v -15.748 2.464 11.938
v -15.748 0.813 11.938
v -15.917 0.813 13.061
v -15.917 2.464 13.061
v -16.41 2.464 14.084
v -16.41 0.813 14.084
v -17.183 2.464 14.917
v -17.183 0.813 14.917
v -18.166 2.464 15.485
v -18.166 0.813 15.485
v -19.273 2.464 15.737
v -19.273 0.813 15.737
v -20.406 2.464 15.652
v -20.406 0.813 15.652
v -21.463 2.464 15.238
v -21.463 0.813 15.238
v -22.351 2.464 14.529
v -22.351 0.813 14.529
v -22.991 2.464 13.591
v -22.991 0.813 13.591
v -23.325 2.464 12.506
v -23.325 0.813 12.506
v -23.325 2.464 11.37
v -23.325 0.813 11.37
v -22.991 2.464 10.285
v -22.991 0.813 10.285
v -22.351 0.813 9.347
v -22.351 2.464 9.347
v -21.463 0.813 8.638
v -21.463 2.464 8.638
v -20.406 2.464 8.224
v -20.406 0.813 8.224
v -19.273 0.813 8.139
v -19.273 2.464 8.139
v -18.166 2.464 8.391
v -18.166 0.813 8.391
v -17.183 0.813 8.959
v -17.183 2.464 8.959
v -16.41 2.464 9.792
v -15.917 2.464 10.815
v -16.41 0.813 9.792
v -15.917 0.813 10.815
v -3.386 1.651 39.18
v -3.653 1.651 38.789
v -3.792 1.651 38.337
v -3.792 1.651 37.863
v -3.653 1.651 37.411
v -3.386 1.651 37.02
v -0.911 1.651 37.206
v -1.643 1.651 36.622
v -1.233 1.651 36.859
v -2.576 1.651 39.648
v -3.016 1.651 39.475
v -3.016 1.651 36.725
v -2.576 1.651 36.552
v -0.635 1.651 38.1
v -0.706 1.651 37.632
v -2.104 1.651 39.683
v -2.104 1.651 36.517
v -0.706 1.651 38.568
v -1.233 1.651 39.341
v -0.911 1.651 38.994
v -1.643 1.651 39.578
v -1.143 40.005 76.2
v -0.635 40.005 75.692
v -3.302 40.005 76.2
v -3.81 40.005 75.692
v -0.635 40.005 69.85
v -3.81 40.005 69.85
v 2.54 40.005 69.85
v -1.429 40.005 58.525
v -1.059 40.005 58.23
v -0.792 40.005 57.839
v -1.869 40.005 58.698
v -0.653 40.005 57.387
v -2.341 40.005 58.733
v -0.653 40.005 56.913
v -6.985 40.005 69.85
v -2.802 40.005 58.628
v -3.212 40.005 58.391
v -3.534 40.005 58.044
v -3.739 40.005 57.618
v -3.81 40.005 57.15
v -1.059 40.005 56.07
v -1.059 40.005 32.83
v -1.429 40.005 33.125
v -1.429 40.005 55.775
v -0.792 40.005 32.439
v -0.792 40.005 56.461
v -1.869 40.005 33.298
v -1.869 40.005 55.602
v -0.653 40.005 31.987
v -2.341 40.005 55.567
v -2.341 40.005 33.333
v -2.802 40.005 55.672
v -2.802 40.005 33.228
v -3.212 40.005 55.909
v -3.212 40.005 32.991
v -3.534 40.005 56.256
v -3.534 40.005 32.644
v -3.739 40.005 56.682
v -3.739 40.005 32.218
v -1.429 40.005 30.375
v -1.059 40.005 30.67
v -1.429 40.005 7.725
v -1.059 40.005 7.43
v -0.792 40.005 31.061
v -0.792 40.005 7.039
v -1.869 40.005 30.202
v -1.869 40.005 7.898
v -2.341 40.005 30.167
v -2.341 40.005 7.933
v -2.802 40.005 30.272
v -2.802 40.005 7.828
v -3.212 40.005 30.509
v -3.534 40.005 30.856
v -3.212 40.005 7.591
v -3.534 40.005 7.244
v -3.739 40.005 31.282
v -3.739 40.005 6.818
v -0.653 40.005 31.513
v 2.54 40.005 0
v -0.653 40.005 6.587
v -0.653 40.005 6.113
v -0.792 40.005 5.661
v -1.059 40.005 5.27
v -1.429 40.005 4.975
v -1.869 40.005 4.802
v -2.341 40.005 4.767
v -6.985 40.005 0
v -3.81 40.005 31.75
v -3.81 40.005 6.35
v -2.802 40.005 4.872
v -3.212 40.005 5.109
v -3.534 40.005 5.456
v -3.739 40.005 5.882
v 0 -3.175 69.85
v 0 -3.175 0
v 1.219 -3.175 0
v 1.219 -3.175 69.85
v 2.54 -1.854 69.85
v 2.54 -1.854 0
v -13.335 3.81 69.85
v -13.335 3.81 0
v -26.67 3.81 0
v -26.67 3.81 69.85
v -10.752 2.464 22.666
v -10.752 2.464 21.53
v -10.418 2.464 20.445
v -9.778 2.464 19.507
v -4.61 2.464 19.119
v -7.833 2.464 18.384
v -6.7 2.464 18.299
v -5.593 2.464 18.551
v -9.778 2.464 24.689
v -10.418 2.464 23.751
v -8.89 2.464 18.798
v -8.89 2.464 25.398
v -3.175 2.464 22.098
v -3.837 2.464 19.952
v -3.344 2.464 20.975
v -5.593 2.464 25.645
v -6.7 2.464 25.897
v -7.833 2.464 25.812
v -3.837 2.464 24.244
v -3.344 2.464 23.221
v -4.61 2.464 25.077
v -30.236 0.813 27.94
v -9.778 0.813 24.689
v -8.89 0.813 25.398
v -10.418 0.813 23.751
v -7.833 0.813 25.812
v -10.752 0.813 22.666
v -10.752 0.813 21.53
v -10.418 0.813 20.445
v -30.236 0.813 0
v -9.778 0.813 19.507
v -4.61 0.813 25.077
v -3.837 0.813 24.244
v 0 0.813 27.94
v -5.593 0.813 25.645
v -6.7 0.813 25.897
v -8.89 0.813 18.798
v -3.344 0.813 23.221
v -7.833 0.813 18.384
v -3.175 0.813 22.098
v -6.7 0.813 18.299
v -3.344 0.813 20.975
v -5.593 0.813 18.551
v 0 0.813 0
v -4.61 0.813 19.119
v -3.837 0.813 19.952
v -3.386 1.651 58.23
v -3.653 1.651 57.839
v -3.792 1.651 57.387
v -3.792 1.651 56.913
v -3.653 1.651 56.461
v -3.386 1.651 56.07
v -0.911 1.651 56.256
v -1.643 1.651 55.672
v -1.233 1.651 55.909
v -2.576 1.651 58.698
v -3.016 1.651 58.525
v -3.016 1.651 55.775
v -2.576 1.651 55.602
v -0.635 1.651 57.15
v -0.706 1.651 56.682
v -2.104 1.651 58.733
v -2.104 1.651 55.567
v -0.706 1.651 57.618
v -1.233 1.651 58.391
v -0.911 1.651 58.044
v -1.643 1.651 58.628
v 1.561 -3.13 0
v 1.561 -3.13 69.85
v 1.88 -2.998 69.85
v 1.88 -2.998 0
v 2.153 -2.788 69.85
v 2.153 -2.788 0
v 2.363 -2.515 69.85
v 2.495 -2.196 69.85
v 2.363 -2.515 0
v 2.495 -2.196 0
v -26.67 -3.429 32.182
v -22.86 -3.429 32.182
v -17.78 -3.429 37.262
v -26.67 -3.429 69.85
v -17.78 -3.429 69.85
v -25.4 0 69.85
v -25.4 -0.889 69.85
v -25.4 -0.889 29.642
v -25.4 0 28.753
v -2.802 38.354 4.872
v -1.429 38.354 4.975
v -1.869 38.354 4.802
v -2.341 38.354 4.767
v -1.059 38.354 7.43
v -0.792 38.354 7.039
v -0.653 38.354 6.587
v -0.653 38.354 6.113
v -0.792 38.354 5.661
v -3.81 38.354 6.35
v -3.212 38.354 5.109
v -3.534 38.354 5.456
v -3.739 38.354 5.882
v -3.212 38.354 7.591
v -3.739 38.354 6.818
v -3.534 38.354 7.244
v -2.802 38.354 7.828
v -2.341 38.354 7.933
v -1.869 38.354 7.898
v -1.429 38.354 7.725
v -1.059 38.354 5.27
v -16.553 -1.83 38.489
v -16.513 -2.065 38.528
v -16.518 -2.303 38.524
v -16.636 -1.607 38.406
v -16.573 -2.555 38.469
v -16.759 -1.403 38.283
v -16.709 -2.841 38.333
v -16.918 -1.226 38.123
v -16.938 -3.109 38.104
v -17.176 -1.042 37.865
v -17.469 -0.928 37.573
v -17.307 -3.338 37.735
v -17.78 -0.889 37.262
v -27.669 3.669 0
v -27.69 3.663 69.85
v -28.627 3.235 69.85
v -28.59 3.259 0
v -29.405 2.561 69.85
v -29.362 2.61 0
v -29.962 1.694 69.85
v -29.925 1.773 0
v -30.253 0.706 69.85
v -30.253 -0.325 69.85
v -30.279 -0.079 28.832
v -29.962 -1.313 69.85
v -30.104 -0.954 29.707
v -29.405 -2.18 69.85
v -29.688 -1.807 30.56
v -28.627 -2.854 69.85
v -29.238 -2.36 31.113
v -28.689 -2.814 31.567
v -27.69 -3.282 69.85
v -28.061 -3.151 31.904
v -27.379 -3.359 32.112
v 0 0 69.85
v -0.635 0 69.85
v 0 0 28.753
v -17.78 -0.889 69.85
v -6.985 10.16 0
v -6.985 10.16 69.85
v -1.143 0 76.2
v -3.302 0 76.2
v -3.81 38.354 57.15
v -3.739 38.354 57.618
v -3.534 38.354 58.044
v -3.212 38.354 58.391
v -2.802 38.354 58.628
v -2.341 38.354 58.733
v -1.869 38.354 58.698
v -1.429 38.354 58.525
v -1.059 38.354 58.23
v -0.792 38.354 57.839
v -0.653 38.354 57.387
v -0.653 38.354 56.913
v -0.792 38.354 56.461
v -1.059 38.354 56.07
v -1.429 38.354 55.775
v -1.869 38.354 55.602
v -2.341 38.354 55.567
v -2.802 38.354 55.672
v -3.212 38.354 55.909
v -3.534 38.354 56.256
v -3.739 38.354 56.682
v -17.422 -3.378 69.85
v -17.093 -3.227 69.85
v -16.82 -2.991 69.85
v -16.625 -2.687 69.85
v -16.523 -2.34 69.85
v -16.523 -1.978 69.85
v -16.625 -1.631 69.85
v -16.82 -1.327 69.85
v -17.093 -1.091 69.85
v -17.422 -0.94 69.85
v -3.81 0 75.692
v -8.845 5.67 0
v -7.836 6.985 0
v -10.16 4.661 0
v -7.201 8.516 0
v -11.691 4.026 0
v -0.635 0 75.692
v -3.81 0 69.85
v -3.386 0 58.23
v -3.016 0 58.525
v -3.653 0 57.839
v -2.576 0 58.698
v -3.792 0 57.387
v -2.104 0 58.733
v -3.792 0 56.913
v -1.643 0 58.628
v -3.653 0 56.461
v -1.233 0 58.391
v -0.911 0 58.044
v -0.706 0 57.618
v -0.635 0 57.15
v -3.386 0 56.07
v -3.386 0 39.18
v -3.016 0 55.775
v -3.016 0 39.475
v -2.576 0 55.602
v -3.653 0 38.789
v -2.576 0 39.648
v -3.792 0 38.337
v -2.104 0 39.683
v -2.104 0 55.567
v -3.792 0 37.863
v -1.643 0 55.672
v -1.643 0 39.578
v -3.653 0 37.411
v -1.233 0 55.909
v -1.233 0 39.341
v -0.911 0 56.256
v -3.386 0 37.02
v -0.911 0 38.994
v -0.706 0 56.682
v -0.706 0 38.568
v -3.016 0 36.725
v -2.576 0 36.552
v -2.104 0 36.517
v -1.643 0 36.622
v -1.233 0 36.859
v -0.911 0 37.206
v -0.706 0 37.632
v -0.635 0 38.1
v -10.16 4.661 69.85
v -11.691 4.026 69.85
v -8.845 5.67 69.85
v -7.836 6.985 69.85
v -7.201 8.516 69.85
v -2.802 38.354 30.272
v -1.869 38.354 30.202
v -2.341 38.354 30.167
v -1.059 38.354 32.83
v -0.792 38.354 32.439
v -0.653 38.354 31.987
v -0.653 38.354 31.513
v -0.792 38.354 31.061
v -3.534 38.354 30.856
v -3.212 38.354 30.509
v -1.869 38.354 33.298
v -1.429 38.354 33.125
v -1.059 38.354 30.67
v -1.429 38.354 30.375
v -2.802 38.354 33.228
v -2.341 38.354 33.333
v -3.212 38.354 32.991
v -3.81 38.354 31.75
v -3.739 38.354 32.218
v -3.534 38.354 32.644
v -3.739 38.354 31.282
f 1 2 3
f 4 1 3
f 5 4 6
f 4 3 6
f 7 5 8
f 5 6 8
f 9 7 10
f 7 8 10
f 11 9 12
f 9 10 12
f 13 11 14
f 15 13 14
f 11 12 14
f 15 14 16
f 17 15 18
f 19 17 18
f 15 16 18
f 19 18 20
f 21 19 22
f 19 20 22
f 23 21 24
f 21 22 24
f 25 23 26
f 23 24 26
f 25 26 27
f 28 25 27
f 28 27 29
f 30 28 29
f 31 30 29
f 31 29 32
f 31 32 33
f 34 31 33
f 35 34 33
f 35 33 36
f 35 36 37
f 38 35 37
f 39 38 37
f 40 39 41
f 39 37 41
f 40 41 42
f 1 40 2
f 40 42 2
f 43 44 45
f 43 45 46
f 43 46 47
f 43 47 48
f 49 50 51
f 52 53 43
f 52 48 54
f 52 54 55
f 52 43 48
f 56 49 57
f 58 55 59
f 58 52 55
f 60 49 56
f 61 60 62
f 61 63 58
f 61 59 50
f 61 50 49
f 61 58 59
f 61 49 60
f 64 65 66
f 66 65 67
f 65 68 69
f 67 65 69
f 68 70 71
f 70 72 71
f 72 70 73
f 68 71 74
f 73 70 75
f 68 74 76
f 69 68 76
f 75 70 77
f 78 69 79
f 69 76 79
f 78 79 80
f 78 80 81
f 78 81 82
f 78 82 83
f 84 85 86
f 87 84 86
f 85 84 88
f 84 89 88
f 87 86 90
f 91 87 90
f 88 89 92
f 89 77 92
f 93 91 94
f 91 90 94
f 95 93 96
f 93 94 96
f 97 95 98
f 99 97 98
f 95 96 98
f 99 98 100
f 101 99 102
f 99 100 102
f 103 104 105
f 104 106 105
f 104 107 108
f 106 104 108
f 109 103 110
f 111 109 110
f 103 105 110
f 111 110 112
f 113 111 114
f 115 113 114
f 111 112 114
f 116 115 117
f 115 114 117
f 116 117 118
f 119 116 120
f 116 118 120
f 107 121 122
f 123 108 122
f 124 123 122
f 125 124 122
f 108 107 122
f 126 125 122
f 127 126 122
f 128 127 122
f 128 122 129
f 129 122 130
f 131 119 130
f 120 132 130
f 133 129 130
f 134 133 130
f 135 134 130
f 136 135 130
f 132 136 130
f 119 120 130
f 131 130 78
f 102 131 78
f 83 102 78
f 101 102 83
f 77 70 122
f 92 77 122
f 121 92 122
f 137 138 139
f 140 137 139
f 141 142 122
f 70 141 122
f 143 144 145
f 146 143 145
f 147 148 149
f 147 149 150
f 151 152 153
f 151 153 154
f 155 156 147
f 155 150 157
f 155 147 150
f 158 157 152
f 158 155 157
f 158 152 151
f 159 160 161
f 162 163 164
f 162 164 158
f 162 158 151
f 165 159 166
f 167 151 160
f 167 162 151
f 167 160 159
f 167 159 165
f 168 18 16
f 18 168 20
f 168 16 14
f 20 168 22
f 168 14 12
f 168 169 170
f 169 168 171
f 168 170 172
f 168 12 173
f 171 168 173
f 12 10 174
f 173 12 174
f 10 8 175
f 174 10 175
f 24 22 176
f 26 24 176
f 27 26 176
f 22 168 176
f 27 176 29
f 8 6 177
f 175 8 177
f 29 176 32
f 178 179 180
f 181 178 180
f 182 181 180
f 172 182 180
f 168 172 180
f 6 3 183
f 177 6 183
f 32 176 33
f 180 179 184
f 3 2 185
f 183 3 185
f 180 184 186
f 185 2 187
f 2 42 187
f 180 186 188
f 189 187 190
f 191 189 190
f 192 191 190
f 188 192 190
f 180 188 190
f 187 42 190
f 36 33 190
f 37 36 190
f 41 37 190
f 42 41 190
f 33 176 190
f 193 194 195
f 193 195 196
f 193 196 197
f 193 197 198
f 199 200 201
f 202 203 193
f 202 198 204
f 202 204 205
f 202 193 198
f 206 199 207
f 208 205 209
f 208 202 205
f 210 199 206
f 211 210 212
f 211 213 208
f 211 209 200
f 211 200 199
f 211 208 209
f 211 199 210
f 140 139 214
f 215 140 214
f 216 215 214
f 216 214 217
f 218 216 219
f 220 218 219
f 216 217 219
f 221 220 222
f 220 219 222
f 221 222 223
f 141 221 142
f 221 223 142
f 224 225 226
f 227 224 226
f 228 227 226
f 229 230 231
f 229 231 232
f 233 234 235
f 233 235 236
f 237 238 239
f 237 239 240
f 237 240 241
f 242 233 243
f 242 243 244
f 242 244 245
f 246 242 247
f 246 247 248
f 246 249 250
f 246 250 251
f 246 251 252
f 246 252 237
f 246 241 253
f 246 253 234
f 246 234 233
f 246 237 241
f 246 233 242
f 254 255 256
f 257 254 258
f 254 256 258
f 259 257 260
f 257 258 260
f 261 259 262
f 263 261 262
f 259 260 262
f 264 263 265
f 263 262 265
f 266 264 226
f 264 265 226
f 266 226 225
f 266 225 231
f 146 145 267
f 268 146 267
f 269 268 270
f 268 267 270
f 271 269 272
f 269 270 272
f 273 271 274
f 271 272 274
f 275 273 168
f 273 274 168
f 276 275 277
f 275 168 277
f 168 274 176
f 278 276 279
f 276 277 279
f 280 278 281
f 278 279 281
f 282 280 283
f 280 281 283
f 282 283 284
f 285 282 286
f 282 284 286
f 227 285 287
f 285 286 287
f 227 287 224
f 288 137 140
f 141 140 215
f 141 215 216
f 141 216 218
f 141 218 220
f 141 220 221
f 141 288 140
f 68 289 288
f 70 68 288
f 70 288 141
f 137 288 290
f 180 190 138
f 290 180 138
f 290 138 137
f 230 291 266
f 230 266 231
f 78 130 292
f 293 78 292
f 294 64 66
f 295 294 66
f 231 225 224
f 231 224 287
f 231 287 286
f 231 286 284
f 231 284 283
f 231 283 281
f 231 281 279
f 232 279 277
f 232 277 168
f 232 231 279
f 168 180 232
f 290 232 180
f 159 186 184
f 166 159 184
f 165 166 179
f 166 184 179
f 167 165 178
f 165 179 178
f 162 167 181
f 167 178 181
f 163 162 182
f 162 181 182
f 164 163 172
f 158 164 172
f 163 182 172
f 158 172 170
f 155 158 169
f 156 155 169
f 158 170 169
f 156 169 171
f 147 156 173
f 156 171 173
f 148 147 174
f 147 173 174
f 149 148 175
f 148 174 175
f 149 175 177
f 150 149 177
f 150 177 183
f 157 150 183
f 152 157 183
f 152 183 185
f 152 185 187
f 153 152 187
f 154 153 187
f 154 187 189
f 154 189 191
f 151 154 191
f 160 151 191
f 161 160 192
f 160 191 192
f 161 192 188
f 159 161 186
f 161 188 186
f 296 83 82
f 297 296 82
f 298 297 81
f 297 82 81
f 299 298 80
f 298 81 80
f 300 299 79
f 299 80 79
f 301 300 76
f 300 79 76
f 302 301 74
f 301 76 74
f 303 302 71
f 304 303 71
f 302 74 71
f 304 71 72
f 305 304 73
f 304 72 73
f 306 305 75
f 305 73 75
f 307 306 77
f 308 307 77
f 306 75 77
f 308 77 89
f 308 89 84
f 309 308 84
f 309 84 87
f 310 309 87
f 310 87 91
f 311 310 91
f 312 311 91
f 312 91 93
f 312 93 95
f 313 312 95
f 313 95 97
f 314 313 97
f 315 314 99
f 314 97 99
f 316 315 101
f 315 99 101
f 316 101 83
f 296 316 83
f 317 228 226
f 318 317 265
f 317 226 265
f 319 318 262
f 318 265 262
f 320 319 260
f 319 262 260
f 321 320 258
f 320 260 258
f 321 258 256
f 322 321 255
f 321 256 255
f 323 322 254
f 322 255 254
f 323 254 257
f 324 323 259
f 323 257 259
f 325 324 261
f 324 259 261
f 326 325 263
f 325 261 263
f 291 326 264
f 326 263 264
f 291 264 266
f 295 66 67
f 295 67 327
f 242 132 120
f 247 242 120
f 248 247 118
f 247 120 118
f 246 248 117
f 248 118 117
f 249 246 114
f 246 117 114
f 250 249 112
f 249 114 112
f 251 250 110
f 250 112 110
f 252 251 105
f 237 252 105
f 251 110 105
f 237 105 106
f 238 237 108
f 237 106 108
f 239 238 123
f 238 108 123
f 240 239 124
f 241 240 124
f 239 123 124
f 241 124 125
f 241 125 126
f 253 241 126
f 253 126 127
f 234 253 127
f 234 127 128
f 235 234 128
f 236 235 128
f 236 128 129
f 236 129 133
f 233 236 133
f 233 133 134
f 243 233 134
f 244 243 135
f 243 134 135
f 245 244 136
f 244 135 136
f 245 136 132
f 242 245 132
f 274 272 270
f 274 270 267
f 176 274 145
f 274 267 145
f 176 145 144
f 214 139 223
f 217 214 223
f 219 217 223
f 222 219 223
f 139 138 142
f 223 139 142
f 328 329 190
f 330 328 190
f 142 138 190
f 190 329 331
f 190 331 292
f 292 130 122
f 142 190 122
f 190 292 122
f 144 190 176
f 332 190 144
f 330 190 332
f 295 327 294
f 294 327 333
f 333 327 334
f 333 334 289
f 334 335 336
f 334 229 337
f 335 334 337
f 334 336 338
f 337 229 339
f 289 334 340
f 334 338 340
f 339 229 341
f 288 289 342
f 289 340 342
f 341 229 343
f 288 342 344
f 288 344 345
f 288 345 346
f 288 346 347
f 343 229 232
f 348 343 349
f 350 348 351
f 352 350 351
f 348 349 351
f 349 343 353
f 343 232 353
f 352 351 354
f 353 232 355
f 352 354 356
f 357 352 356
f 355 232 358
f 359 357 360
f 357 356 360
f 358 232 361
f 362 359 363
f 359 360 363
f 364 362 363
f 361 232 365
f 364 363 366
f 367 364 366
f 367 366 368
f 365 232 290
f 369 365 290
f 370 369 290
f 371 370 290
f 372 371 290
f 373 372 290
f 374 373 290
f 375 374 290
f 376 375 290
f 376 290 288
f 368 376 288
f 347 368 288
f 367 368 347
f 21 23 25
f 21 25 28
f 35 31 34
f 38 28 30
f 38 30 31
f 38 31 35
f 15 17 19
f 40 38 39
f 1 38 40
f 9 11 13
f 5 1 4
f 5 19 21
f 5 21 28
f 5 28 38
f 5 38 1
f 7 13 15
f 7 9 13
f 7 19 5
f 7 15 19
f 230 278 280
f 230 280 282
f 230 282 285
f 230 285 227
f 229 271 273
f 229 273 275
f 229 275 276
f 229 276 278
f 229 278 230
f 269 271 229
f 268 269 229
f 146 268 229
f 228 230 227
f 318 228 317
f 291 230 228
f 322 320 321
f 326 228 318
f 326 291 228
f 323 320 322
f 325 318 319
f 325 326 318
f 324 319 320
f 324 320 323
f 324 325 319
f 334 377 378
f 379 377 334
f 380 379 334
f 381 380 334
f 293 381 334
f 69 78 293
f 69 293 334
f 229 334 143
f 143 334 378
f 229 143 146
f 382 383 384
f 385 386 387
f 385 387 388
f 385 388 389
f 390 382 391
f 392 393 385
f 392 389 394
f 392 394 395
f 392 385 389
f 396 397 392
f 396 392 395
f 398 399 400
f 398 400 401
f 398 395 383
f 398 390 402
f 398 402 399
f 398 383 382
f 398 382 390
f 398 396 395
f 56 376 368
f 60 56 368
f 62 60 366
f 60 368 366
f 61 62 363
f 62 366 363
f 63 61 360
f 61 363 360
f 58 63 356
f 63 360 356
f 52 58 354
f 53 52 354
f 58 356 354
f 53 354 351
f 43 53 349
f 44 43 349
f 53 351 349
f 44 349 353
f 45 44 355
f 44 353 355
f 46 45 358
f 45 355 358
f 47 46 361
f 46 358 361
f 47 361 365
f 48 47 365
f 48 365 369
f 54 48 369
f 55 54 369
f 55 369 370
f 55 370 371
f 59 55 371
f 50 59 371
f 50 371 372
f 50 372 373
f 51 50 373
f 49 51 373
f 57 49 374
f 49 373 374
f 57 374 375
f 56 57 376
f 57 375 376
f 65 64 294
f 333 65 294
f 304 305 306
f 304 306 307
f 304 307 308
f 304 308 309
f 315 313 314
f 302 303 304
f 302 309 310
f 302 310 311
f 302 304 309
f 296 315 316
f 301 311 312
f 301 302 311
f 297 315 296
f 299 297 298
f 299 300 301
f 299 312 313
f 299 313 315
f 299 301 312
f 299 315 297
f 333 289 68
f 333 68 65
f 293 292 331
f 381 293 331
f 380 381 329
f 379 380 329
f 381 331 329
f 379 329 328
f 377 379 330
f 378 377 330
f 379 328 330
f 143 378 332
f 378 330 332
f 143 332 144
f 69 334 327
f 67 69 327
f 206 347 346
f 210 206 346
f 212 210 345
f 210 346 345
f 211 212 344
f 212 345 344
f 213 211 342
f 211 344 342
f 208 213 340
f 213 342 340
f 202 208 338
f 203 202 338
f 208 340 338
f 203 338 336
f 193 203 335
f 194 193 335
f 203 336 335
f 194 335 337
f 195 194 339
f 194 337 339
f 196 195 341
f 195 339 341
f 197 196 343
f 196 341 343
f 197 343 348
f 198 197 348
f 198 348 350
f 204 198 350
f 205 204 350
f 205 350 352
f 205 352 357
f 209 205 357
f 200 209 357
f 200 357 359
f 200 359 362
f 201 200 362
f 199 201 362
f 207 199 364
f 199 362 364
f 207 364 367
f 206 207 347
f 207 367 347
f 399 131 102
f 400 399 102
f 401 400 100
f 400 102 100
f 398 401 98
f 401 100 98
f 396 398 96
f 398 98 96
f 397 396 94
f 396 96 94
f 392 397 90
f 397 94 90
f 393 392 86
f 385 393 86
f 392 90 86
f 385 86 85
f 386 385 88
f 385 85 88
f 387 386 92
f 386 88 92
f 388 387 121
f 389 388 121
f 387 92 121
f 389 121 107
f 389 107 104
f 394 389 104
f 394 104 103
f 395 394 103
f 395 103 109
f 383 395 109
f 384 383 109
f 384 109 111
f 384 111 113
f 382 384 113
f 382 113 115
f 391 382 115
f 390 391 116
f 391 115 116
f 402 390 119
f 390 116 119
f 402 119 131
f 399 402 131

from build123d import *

# Parameters (mm, degrees)
F1_DEPTH  = 69.85
F2_W      = 3.175
F2_H      = 6.35
F3_DEPTH  = 40.005
F4_SIZE   = 0.508
F5_R      = 1.5875
F6_DEPTH  = 1.651
F7_R      = 1.5875
F8_DEPTH  = 1.651
F9_W      = 30.2895
F9_H      = 4.2418
F10_DEPTH = 27.94
F11_R     = 3.81
F12_DEPTH = 1.651
F14_DEPTH = 30.2905
F16_DEPTH = 2.54


with BuildPart() as f1:
    # F0 (on Top) → F1 (new body)
    with BuildSketch(Plane.XY):
        with BuildLine():
            Line((2.54, 40.005), (-6.985, 40.005))
            Line((-6.985, 40.005), (-6.985, 10.16))
            ThreePointArc((-6.985, 10.16), (-8.8448719395, 5.6698719395), (-13.335, 3.81))
            Line((-13.335, 3.81), (-26.67, 3.81))
            ThreePointArc((-26.67, 3.81), (-30.2895, 0.1905), (-26.67, -3.429))
            Line((-26.67, -3.429), (-17.78, -3.429))
            ThreePointArc((-17.78, -3.429), (-16.51, -2.159), (-17.78, -0.889))
            Line((-17.78, -0.889), (-25.4, -0.889))
            Line((-25.4, -0.889), (-25.4, 0))
            Line((-25.4, 0), (0, 0))
            Line((0, 0), (0, -3.175))
            Line((0, -3.175), (1.2192, -3.175))
            ThreePointArc((1.2192, -3.175), (2.1531466366, -2.7881466366), (2.54, -1.8542))
            Line((2.54, -1.8542), (2.54, 40.005))
        make_face()
    extrude(amount=F1_DEPTH)

    # F2 (on face) → F3 (join, through all)
    with BuildSketch(Plane(origin=(0, 40.005, 0), x_dir=(-1, 0, 0), z_dir=(0, 1, 0))):
        with Locations((2.2225, 73.025)):
            Rectangle(F2_W, F2_H)
    extrude(amount=-F3_DEPTH)

    # F4
    f4_edges = [f1.edges().sort_by_distance(p)[0] for p in [
        (-0.635, 20.0025, 76.2),
        (-3.81, 20.0025, 76.2),
    ]]
    chamfer(f4_edges, length=F4_SIZE)

    # F5 (on face) → F6 (cut)
    with BuildSketch(Plane(origin=(0, 40.005, 0), x_dir=(-1, 0, 0), z_dir=(0, 1, 0))):
        with Locations((2.2225, 6.35)):
            Circle(F5_R)
        with Locations((2.2225, 31.75)):
            Circle(F5_R)
        with Locations((2.2225, 57.15)):
            Circle(F5_R)
    extrude(amount=-F6_DEPTH, mode=Mode.SUBTRACT)

    # F7 (on face) → F8 (cut)
    with BuildSketch(Plane.XZ):
        with Locations((-2.2225, 57.15)):
            Circle(F7_R)
        with Locations((-2.2225, 38.1)):
            Circle(F7_R)
    extrude(amount=-F8_DEPTH, mode=Mode.SUBTRACT)

    # F9 (on face) → F10 (cut)
    with BuildSketch(Plane(origin=(0, 0, 0), x_dir=(1, 0, 0), z_dir=(0, 0, -1))):
        with Locations((-15.14475, 1.3081)):
            Rectangle(F9_W, F9_H)
    extrude(amount=-F10_DEPTH, mode=Mode.SUBTRACT)

    # F11 (on face) → F12 (cut)
    with BuildSketch(Plane.XZ.offset(-0.8128)):
        with Locations((-6.985, 22.098)):
            Circle(F11_R)
        with Locations((-19.558, 11.938)):
            Circle(F11_R)
    extrude(amount=-F12_DEPTH, mode=Mode.SUBTRACT)

    # F13 (on face) → F14 (cut, through all)
    with BuildSketch(Plane(origin=(0, 0, 0), x_dir=(0, -1, 0), z_dir=(-1, 0, 0))):
        Polygon((3.429, 32.1818), (-0.8128, 27.94), (3.429, 27.94), align=None)
    extrude(amount=F14_DEPTH, mode=Mode.SUBTRACT)

    # F15 (on face) → F16 (cut, through all)
    with BuildSketch(Plane.XZ.offset(3.429)):
        Polygon((-12.7, 42.3418), (-25.4, 29.6418), (-12.7, 29.6418), align=None)
    extrude(amount=-F16_DEPTH, mode=Mode.SUBTRACT)


solid = f1.part
